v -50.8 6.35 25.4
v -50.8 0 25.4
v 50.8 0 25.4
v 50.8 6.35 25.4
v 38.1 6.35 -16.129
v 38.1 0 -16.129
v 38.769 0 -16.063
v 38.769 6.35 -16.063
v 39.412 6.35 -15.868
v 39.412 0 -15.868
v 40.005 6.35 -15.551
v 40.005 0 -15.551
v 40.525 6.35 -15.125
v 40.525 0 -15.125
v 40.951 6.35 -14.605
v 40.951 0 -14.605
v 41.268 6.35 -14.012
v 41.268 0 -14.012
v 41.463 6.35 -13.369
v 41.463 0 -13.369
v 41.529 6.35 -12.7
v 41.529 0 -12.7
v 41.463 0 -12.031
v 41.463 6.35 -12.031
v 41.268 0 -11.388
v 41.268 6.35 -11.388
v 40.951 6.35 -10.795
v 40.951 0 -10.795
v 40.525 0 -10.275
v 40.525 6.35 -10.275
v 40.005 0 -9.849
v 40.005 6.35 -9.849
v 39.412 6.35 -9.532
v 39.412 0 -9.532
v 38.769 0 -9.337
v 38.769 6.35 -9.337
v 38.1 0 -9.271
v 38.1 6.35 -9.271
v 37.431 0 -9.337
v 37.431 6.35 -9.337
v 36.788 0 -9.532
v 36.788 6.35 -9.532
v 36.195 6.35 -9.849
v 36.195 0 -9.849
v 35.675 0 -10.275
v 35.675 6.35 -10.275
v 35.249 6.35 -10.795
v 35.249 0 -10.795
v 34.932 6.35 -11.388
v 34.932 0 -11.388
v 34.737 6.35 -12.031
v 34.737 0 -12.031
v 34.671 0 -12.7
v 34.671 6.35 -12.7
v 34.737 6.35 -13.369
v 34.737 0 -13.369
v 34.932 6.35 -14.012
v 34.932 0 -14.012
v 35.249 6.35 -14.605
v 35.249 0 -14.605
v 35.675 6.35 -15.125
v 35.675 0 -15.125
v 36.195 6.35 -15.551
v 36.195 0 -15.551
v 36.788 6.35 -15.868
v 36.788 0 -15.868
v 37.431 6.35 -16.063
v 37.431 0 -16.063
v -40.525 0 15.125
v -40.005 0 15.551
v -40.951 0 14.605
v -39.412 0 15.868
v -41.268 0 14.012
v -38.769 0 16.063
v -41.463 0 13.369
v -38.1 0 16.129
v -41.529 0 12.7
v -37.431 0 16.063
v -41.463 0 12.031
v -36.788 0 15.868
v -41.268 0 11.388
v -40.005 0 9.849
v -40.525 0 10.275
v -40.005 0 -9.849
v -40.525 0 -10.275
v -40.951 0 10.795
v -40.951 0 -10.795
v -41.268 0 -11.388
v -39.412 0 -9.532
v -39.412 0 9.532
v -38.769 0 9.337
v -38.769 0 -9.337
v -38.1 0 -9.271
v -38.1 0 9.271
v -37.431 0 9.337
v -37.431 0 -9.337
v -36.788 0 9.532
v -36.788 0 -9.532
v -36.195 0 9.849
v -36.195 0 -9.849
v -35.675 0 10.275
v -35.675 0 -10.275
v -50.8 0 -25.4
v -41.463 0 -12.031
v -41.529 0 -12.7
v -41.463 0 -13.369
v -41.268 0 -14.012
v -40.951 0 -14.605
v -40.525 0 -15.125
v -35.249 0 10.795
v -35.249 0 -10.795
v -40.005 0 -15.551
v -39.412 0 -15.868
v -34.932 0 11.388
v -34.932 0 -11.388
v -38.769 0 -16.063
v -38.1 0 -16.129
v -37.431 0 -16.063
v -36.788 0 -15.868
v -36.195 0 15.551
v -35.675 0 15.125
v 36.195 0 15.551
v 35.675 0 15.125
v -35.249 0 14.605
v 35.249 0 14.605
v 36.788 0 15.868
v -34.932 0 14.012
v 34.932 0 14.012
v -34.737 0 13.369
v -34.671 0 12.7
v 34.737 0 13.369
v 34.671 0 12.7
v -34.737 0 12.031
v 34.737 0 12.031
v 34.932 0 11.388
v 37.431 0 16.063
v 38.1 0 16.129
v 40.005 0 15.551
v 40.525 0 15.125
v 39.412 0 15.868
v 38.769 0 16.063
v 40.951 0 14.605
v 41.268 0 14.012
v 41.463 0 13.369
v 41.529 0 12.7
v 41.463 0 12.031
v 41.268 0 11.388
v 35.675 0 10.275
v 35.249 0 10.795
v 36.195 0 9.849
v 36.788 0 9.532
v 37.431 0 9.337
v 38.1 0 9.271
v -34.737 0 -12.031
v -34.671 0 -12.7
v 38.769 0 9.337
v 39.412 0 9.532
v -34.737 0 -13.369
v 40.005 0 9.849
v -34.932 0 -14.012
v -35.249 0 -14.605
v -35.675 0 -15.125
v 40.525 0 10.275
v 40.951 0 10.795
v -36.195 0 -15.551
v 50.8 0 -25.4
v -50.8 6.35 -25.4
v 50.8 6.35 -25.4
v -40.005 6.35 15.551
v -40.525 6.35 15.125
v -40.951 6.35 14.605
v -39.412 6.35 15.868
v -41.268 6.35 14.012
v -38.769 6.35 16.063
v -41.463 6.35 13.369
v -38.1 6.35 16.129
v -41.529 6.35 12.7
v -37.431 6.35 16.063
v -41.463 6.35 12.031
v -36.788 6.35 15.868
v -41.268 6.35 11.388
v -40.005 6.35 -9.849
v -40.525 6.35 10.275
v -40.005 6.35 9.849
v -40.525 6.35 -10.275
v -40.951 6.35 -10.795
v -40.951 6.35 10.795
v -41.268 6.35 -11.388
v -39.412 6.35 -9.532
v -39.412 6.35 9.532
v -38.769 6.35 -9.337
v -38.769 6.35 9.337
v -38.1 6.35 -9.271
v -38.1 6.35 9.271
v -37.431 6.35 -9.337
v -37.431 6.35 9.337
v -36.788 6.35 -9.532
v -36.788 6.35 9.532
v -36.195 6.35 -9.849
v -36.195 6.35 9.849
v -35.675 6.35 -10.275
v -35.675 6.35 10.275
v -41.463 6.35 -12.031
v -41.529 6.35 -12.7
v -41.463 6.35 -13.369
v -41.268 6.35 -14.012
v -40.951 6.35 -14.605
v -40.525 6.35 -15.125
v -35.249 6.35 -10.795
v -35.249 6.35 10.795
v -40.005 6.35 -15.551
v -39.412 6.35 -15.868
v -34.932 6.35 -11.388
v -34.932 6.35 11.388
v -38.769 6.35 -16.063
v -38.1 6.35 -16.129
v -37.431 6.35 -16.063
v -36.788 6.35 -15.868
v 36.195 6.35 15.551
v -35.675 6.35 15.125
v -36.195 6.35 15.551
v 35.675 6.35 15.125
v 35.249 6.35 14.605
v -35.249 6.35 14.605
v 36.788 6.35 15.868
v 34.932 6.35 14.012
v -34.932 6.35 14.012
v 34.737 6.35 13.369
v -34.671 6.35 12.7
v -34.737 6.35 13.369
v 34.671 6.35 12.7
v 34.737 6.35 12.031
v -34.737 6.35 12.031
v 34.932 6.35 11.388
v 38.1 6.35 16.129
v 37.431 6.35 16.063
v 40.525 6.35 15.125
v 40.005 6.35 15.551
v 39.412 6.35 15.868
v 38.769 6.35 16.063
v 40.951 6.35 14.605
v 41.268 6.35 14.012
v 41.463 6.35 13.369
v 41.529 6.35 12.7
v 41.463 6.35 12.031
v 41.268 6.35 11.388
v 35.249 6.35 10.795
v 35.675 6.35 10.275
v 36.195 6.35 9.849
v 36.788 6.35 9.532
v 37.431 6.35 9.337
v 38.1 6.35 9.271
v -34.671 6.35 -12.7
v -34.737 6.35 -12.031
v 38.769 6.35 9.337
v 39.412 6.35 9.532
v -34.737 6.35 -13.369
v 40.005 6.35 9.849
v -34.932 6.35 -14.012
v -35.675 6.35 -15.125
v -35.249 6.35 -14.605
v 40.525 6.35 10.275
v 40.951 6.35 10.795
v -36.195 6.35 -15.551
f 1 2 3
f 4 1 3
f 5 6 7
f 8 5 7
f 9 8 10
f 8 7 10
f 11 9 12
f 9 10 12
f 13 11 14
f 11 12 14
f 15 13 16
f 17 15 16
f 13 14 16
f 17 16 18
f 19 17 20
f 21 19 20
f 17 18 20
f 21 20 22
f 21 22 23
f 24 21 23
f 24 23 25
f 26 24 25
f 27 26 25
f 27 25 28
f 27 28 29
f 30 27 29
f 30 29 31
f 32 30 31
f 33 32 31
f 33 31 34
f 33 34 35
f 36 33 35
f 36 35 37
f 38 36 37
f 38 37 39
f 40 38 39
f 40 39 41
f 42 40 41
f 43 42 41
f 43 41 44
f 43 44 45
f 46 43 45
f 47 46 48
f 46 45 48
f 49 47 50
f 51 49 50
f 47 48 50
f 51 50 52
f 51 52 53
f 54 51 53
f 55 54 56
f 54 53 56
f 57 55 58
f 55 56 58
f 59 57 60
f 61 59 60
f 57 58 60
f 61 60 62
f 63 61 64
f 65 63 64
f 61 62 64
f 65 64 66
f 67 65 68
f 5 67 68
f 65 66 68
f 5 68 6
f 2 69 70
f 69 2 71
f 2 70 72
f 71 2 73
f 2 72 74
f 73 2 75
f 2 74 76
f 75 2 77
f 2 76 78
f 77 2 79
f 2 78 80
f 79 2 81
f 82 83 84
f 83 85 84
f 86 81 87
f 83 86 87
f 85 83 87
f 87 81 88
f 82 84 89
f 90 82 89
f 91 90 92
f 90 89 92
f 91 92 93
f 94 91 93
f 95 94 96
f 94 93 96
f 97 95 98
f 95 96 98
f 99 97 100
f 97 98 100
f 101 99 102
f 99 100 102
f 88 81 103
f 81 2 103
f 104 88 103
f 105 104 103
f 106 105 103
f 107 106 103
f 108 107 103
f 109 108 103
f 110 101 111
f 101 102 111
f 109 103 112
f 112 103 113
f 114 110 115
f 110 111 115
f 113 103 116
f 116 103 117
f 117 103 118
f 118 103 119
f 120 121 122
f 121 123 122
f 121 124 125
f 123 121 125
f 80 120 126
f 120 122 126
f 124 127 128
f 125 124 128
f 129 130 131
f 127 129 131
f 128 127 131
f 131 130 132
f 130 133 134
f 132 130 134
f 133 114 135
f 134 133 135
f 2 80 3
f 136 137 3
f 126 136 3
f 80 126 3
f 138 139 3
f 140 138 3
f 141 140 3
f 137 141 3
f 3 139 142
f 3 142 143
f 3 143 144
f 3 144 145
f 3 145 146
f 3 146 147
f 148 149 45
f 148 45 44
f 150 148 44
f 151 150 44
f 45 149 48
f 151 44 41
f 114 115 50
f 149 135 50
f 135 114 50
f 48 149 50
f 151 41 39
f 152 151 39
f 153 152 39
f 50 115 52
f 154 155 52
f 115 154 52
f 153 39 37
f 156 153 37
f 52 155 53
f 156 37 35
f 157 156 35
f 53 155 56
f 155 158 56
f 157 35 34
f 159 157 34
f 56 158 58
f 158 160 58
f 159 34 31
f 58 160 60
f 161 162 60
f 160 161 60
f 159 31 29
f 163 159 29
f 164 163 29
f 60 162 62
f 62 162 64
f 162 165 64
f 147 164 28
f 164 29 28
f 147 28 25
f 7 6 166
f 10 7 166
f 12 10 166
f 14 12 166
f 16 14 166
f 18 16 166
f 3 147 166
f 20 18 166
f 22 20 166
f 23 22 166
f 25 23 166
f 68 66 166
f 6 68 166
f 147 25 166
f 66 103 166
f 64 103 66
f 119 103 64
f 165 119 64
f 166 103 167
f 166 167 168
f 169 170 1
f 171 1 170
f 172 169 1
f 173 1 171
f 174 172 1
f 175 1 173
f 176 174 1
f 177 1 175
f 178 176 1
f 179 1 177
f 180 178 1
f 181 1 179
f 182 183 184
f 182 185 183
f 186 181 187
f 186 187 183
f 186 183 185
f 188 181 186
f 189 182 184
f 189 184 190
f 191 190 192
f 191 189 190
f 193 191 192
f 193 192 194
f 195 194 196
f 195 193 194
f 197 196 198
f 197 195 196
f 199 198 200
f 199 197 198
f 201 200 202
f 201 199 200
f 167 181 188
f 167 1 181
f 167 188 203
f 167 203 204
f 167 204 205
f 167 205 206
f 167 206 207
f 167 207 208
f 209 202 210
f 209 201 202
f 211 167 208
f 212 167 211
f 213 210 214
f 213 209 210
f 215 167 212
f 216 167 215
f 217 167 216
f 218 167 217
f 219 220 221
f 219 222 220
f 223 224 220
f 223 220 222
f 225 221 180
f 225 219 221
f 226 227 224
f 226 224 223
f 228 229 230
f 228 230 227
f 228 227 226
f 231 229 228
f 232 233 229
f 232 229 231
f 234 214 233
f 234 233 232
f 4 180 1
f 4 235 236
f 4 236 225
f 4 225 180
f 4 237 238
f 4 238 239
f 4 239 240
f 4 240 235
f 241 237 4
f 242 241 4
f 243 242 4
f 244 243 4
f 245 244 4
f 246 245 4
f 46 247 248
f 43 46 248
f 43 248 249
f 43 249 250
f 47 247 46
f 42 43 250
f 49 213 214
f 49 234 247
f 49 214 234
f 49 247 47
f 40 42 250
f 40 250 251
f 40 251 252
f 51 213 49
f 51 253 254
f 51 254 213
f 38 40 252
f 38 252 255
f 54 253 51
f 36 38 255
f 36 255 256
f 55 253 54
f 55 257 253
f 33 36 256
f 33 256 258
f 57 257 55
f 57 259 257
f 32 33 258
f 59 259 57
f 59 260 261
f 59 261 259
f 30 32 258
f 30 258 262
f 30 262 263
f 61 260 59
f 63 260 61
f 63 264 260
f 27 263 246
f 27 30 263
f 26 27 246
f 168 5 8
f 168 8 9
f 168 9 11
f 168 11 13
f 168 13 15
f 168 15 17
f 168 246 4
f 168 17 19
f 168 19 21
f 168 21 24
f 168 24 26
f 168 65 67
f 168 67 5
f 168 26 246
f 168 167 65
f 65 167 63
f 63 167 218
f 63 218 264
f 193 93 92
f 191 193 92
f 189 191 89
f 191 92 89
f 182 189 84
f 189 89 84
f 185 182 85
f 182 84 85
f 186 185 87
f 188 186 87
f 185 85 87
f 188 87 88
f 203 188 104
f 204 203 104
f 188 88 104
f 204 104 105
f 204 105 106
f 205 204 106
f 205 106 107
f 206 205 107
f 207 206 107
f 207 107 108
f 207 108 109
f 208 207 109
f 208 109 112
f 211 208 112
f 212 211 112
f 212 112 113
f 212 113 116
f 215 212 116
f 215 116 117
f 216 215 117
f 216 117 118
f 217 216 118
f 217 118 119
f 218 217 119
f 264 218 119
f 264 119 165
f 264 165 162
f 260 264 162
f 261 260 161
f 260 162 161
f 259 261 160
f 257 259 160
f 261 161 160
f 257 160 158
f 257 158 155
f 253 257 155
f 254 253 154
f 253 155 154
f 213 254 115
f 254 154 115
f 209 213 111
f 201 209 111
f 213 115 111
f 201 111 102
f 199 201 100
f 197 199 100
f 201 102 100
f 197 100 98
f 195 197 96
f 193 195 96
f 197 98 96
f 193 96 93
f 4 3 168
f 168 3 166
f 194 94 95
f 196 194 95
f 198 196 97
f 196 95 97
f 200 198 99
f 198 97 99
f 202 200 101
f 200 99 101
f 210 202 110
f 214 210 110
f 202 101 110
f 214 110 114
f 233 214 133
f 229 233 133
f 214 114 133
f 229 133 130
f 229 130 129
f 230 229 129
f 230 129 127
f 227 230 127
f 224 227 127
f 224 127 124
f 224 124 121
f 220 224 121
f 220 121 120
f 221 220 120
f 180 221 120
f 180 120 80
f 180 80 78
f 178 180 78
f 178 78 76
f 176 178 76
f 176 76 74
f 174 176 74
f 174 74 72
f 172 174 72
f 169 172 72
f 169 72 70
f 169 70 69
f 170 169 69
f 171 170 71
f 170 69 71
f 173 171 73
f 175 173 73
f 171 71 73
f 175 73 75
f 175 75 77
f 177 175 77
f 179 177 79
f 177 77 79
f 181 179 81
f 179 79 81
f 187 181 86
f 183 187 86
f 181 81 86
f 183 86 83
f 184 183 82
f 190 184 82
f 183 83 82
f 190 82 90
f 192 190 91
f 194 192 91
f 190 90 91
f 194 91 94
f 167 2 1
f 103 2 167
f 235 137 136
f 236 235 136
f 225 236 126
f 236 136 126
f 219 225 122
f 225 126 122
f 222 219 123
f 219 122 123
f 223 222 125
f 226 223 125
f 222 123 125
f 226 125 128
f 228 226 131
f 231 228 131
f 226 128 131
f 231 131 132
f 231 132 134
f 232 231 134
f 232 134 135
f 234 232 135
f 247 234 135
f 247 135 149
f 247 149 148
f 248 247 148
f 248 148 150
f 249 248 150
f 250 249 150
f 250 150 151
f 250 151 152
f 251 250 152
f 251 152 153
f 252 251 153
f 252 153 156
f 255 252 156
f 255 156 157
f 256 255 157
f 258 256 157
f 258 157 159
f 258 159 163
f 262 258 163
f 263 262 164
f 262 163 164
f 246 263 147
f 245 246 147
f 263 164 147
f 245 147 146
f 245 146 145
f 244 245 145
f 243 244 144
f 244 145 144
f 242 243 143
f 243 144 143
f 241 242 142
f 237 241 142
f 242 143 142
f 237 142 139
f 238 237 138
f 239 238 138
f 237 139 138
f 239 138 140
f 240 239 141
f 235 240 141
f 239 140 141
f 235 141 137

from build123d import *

# Parameters (mm, degrees)
SKETCH1_W           = 101.6
SKETCH1_H           = 50.8
BOSS_EXTRUDE1_DEPTH = 6.35
CUT_EXTRUDE2_REACH  = 59.15
SKETCH3_R           = 3.429


with BuildPart() as part:
    # Sketch1 → Boss-Extrude1 (new body)
    with BuildSketch(Plane(origin=(0, 0, 0), x_dir=(1, 0, 0), z_dir=(0, 1, 0))):
        Rectangle(SKETCH1_W, SKETCH1_H)
    extrude(amount=BOSS_EXTRUDE1_DEPTH)

    # Sketch3 → Cut-Extrude2 (cut, up to next)
    with BuildSketch(Plane.XZ, mode=Mode.PRIVATE) as cut_extrude2_sk1:
        with Locations(Location((-38.1, 12.7, 0), (0, 0, 270))):
            Circle(SKETCH3_R)
    cut_extrude2_tool1 = extrude(cut_extrude2_sk1.sketch, amount=-CUT_EXTRUDE2_REACH, mode=Mode.PRIVATE) & part.part
    # Sketch3 → Cut-Extrude2 (cut, up to next)
    with BuildSketch(Plane.XZ, mode=Mode.PRIVATE) as cut_extrude2_sk2:
        with Locations(Location((-38.1, -12.7, 0), (0, 0, 90))):
            Circle(SKETCH3_R)
    cut_extrude2_tool2 = extrude(cut_extrude2_sk2.sketch, amount=-CUT_EXTRUDE2_REACH, mode=Mode.PRIVATE) & part.part
    # Sketch3 → Cut-Extrude2 (cut, up to next)
    with BuildSketch(Plane.XZ, mode=Mode.PRIVATE) as cut_extrude2_sk3:
        with Locations(Location((38.1, 12.7, 0), (0, 0, 90))):
            Circle(SKETCH3_R)
    cut_extrude2_tool3 = extrude(cut_extrude2_sk3.sketch, amount=-CUT_EXTRUDE2_REACH, mode=Mode.PRIVATE) & part.part
    # Sketch3 → Cut-Extrude2 (cut, up to next)
    with BuildSketch(Plane.XZ, mode=Mode.PRIVATE) as cut_extrude2_sk4:
        with Locations(Location((38.1, -12.7, 0), (0, 0, 270))):
            Circle(SKETCH3_R)
    cut_extrude2_tool4 = extrude(cut_extrude2_sk4.sketch, amount=-CUT_EXTRUDE2_REACH, mode=Mode.PRIVATE) & part.part
    add(cut_extrude2_tool1.solids().sort_by_distance((-38.1, 0, 12.7))[0], mode=Mode.SUBTRACT)
    add(cut_extrude2_tool2.solids().sort_by_distance((-38.1, 0, -12.7))[0], mode=Mode.SUBTRACT)
    add(cut_extrude2_tool3.solids().sort_by_distance((38.1, 0, 12.7))[0], mode=Mode.SUBTRACT)
    add(cut_extrude2_tool4.solids().sort_by_distance((38.1, 0, -12.7))[0], mode=Mode.SUBTRACT)


solid = part.part
